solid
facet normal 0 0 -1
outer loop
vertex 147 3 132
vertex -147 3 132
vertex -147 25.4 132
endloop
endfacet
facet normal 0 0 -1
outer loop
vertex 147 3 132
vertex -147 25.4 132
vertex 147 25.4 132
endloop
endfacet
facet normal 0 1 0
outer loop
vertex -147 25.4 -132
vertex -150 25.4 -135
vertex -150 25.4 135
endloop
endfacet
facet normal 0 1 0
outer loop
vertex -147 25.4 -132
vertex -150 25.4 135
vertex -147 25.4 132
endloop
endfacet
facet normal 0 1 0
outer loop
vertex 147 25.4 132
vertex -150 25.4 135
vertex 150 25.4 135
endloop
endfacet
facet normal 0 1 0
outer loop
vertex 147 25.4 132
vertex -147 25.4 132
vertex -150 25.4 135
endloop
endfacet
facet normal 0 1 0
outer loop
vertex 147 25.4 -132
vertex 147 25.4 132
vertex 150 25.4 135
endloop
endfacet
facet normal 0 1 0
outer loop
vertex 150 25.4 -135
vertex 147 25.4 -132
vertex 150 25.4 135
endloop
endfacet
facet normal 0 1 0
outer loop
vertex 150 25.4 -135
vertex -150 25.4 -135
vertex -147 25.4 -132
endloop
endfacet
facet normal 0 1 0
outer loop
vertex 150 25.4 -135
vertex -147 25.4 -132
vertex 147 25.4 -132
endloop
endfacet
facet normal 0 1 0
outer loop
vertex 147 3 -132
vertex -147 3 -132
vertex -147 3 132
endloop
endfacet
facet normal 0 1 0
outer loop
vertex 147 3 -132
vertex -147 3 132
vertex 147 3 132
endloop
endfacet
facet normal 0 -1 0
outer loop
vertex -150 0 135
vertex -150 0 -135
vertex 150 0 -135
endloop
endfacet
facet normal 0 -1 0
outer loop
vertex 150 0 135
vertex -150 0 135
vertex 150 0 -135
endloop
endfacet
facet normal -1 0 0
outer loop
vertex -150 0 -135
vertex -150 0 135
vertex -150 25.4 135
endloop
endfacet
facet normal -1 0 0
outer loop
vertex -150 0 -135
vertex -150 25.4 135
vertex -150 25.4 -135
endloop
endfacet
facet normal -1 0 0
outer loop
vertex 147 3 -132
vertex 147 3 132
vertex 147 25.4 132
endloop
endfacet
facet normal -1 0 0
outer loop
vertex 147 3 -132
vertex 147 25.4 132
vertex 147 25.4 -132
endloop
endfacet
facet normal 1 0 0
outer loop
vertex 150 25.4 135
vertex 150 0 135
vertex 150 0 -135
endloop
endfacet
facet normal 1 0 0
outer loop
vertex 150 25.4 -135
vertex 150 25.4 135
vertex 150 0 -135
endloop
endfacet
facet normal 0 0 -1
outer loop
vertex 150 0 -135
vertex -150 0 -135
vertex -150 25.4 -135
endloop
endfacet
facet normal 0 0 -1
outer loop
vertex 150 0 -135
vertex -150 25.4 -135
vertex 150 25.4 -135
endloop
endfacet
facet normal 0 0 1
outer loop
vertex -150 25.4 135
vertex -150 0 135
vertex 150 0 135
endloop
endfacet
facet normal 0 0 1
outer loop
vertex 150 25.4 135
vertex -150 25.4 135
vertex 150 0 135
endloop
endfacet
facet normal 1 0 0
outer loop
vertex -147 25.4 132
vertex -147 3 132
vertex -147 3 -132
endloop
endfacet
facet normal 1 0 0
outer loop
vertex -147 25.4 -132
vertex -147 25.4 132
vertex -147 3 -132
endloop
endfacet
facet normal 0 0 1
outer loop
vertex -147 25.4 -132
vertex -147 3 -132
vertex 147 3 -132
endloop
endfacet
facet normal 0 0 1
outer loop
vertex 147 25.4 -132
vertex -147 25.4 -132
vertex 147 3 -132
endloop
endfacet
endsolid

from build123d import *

# Parameters (mm, degrees)
CROQUIS1_W              = 300
CROQUIS1_H              = 270
SALIENTE_EXTRUIR1_DEPTH = 25.4
VACIADO1_T              = -3


with BuildPart() as part:
    # Croquis1 → Saliente-Extruir1 (new body)
    with BuildSketch(Plane(origin=(0, 0, 0), x_dir=(1, 0, 0), z_dir=(0, 1, 0))):
        Rectangle(CROQUIS1_W, CROQUIS1_H)
    extrude(amount=SALIENTE_EXTRUIR1_DEPTH)

    # Vaciado1
    vaciado1_openings = [part.faces().sort_by_distance(p)[0] for p in [
        (0, 25.4, 0),
    ]]
    offset(amount=VACIADO1_T, openings=vaciado1_openings, kind=Kind.INTERSECTION)


solid = part.part
